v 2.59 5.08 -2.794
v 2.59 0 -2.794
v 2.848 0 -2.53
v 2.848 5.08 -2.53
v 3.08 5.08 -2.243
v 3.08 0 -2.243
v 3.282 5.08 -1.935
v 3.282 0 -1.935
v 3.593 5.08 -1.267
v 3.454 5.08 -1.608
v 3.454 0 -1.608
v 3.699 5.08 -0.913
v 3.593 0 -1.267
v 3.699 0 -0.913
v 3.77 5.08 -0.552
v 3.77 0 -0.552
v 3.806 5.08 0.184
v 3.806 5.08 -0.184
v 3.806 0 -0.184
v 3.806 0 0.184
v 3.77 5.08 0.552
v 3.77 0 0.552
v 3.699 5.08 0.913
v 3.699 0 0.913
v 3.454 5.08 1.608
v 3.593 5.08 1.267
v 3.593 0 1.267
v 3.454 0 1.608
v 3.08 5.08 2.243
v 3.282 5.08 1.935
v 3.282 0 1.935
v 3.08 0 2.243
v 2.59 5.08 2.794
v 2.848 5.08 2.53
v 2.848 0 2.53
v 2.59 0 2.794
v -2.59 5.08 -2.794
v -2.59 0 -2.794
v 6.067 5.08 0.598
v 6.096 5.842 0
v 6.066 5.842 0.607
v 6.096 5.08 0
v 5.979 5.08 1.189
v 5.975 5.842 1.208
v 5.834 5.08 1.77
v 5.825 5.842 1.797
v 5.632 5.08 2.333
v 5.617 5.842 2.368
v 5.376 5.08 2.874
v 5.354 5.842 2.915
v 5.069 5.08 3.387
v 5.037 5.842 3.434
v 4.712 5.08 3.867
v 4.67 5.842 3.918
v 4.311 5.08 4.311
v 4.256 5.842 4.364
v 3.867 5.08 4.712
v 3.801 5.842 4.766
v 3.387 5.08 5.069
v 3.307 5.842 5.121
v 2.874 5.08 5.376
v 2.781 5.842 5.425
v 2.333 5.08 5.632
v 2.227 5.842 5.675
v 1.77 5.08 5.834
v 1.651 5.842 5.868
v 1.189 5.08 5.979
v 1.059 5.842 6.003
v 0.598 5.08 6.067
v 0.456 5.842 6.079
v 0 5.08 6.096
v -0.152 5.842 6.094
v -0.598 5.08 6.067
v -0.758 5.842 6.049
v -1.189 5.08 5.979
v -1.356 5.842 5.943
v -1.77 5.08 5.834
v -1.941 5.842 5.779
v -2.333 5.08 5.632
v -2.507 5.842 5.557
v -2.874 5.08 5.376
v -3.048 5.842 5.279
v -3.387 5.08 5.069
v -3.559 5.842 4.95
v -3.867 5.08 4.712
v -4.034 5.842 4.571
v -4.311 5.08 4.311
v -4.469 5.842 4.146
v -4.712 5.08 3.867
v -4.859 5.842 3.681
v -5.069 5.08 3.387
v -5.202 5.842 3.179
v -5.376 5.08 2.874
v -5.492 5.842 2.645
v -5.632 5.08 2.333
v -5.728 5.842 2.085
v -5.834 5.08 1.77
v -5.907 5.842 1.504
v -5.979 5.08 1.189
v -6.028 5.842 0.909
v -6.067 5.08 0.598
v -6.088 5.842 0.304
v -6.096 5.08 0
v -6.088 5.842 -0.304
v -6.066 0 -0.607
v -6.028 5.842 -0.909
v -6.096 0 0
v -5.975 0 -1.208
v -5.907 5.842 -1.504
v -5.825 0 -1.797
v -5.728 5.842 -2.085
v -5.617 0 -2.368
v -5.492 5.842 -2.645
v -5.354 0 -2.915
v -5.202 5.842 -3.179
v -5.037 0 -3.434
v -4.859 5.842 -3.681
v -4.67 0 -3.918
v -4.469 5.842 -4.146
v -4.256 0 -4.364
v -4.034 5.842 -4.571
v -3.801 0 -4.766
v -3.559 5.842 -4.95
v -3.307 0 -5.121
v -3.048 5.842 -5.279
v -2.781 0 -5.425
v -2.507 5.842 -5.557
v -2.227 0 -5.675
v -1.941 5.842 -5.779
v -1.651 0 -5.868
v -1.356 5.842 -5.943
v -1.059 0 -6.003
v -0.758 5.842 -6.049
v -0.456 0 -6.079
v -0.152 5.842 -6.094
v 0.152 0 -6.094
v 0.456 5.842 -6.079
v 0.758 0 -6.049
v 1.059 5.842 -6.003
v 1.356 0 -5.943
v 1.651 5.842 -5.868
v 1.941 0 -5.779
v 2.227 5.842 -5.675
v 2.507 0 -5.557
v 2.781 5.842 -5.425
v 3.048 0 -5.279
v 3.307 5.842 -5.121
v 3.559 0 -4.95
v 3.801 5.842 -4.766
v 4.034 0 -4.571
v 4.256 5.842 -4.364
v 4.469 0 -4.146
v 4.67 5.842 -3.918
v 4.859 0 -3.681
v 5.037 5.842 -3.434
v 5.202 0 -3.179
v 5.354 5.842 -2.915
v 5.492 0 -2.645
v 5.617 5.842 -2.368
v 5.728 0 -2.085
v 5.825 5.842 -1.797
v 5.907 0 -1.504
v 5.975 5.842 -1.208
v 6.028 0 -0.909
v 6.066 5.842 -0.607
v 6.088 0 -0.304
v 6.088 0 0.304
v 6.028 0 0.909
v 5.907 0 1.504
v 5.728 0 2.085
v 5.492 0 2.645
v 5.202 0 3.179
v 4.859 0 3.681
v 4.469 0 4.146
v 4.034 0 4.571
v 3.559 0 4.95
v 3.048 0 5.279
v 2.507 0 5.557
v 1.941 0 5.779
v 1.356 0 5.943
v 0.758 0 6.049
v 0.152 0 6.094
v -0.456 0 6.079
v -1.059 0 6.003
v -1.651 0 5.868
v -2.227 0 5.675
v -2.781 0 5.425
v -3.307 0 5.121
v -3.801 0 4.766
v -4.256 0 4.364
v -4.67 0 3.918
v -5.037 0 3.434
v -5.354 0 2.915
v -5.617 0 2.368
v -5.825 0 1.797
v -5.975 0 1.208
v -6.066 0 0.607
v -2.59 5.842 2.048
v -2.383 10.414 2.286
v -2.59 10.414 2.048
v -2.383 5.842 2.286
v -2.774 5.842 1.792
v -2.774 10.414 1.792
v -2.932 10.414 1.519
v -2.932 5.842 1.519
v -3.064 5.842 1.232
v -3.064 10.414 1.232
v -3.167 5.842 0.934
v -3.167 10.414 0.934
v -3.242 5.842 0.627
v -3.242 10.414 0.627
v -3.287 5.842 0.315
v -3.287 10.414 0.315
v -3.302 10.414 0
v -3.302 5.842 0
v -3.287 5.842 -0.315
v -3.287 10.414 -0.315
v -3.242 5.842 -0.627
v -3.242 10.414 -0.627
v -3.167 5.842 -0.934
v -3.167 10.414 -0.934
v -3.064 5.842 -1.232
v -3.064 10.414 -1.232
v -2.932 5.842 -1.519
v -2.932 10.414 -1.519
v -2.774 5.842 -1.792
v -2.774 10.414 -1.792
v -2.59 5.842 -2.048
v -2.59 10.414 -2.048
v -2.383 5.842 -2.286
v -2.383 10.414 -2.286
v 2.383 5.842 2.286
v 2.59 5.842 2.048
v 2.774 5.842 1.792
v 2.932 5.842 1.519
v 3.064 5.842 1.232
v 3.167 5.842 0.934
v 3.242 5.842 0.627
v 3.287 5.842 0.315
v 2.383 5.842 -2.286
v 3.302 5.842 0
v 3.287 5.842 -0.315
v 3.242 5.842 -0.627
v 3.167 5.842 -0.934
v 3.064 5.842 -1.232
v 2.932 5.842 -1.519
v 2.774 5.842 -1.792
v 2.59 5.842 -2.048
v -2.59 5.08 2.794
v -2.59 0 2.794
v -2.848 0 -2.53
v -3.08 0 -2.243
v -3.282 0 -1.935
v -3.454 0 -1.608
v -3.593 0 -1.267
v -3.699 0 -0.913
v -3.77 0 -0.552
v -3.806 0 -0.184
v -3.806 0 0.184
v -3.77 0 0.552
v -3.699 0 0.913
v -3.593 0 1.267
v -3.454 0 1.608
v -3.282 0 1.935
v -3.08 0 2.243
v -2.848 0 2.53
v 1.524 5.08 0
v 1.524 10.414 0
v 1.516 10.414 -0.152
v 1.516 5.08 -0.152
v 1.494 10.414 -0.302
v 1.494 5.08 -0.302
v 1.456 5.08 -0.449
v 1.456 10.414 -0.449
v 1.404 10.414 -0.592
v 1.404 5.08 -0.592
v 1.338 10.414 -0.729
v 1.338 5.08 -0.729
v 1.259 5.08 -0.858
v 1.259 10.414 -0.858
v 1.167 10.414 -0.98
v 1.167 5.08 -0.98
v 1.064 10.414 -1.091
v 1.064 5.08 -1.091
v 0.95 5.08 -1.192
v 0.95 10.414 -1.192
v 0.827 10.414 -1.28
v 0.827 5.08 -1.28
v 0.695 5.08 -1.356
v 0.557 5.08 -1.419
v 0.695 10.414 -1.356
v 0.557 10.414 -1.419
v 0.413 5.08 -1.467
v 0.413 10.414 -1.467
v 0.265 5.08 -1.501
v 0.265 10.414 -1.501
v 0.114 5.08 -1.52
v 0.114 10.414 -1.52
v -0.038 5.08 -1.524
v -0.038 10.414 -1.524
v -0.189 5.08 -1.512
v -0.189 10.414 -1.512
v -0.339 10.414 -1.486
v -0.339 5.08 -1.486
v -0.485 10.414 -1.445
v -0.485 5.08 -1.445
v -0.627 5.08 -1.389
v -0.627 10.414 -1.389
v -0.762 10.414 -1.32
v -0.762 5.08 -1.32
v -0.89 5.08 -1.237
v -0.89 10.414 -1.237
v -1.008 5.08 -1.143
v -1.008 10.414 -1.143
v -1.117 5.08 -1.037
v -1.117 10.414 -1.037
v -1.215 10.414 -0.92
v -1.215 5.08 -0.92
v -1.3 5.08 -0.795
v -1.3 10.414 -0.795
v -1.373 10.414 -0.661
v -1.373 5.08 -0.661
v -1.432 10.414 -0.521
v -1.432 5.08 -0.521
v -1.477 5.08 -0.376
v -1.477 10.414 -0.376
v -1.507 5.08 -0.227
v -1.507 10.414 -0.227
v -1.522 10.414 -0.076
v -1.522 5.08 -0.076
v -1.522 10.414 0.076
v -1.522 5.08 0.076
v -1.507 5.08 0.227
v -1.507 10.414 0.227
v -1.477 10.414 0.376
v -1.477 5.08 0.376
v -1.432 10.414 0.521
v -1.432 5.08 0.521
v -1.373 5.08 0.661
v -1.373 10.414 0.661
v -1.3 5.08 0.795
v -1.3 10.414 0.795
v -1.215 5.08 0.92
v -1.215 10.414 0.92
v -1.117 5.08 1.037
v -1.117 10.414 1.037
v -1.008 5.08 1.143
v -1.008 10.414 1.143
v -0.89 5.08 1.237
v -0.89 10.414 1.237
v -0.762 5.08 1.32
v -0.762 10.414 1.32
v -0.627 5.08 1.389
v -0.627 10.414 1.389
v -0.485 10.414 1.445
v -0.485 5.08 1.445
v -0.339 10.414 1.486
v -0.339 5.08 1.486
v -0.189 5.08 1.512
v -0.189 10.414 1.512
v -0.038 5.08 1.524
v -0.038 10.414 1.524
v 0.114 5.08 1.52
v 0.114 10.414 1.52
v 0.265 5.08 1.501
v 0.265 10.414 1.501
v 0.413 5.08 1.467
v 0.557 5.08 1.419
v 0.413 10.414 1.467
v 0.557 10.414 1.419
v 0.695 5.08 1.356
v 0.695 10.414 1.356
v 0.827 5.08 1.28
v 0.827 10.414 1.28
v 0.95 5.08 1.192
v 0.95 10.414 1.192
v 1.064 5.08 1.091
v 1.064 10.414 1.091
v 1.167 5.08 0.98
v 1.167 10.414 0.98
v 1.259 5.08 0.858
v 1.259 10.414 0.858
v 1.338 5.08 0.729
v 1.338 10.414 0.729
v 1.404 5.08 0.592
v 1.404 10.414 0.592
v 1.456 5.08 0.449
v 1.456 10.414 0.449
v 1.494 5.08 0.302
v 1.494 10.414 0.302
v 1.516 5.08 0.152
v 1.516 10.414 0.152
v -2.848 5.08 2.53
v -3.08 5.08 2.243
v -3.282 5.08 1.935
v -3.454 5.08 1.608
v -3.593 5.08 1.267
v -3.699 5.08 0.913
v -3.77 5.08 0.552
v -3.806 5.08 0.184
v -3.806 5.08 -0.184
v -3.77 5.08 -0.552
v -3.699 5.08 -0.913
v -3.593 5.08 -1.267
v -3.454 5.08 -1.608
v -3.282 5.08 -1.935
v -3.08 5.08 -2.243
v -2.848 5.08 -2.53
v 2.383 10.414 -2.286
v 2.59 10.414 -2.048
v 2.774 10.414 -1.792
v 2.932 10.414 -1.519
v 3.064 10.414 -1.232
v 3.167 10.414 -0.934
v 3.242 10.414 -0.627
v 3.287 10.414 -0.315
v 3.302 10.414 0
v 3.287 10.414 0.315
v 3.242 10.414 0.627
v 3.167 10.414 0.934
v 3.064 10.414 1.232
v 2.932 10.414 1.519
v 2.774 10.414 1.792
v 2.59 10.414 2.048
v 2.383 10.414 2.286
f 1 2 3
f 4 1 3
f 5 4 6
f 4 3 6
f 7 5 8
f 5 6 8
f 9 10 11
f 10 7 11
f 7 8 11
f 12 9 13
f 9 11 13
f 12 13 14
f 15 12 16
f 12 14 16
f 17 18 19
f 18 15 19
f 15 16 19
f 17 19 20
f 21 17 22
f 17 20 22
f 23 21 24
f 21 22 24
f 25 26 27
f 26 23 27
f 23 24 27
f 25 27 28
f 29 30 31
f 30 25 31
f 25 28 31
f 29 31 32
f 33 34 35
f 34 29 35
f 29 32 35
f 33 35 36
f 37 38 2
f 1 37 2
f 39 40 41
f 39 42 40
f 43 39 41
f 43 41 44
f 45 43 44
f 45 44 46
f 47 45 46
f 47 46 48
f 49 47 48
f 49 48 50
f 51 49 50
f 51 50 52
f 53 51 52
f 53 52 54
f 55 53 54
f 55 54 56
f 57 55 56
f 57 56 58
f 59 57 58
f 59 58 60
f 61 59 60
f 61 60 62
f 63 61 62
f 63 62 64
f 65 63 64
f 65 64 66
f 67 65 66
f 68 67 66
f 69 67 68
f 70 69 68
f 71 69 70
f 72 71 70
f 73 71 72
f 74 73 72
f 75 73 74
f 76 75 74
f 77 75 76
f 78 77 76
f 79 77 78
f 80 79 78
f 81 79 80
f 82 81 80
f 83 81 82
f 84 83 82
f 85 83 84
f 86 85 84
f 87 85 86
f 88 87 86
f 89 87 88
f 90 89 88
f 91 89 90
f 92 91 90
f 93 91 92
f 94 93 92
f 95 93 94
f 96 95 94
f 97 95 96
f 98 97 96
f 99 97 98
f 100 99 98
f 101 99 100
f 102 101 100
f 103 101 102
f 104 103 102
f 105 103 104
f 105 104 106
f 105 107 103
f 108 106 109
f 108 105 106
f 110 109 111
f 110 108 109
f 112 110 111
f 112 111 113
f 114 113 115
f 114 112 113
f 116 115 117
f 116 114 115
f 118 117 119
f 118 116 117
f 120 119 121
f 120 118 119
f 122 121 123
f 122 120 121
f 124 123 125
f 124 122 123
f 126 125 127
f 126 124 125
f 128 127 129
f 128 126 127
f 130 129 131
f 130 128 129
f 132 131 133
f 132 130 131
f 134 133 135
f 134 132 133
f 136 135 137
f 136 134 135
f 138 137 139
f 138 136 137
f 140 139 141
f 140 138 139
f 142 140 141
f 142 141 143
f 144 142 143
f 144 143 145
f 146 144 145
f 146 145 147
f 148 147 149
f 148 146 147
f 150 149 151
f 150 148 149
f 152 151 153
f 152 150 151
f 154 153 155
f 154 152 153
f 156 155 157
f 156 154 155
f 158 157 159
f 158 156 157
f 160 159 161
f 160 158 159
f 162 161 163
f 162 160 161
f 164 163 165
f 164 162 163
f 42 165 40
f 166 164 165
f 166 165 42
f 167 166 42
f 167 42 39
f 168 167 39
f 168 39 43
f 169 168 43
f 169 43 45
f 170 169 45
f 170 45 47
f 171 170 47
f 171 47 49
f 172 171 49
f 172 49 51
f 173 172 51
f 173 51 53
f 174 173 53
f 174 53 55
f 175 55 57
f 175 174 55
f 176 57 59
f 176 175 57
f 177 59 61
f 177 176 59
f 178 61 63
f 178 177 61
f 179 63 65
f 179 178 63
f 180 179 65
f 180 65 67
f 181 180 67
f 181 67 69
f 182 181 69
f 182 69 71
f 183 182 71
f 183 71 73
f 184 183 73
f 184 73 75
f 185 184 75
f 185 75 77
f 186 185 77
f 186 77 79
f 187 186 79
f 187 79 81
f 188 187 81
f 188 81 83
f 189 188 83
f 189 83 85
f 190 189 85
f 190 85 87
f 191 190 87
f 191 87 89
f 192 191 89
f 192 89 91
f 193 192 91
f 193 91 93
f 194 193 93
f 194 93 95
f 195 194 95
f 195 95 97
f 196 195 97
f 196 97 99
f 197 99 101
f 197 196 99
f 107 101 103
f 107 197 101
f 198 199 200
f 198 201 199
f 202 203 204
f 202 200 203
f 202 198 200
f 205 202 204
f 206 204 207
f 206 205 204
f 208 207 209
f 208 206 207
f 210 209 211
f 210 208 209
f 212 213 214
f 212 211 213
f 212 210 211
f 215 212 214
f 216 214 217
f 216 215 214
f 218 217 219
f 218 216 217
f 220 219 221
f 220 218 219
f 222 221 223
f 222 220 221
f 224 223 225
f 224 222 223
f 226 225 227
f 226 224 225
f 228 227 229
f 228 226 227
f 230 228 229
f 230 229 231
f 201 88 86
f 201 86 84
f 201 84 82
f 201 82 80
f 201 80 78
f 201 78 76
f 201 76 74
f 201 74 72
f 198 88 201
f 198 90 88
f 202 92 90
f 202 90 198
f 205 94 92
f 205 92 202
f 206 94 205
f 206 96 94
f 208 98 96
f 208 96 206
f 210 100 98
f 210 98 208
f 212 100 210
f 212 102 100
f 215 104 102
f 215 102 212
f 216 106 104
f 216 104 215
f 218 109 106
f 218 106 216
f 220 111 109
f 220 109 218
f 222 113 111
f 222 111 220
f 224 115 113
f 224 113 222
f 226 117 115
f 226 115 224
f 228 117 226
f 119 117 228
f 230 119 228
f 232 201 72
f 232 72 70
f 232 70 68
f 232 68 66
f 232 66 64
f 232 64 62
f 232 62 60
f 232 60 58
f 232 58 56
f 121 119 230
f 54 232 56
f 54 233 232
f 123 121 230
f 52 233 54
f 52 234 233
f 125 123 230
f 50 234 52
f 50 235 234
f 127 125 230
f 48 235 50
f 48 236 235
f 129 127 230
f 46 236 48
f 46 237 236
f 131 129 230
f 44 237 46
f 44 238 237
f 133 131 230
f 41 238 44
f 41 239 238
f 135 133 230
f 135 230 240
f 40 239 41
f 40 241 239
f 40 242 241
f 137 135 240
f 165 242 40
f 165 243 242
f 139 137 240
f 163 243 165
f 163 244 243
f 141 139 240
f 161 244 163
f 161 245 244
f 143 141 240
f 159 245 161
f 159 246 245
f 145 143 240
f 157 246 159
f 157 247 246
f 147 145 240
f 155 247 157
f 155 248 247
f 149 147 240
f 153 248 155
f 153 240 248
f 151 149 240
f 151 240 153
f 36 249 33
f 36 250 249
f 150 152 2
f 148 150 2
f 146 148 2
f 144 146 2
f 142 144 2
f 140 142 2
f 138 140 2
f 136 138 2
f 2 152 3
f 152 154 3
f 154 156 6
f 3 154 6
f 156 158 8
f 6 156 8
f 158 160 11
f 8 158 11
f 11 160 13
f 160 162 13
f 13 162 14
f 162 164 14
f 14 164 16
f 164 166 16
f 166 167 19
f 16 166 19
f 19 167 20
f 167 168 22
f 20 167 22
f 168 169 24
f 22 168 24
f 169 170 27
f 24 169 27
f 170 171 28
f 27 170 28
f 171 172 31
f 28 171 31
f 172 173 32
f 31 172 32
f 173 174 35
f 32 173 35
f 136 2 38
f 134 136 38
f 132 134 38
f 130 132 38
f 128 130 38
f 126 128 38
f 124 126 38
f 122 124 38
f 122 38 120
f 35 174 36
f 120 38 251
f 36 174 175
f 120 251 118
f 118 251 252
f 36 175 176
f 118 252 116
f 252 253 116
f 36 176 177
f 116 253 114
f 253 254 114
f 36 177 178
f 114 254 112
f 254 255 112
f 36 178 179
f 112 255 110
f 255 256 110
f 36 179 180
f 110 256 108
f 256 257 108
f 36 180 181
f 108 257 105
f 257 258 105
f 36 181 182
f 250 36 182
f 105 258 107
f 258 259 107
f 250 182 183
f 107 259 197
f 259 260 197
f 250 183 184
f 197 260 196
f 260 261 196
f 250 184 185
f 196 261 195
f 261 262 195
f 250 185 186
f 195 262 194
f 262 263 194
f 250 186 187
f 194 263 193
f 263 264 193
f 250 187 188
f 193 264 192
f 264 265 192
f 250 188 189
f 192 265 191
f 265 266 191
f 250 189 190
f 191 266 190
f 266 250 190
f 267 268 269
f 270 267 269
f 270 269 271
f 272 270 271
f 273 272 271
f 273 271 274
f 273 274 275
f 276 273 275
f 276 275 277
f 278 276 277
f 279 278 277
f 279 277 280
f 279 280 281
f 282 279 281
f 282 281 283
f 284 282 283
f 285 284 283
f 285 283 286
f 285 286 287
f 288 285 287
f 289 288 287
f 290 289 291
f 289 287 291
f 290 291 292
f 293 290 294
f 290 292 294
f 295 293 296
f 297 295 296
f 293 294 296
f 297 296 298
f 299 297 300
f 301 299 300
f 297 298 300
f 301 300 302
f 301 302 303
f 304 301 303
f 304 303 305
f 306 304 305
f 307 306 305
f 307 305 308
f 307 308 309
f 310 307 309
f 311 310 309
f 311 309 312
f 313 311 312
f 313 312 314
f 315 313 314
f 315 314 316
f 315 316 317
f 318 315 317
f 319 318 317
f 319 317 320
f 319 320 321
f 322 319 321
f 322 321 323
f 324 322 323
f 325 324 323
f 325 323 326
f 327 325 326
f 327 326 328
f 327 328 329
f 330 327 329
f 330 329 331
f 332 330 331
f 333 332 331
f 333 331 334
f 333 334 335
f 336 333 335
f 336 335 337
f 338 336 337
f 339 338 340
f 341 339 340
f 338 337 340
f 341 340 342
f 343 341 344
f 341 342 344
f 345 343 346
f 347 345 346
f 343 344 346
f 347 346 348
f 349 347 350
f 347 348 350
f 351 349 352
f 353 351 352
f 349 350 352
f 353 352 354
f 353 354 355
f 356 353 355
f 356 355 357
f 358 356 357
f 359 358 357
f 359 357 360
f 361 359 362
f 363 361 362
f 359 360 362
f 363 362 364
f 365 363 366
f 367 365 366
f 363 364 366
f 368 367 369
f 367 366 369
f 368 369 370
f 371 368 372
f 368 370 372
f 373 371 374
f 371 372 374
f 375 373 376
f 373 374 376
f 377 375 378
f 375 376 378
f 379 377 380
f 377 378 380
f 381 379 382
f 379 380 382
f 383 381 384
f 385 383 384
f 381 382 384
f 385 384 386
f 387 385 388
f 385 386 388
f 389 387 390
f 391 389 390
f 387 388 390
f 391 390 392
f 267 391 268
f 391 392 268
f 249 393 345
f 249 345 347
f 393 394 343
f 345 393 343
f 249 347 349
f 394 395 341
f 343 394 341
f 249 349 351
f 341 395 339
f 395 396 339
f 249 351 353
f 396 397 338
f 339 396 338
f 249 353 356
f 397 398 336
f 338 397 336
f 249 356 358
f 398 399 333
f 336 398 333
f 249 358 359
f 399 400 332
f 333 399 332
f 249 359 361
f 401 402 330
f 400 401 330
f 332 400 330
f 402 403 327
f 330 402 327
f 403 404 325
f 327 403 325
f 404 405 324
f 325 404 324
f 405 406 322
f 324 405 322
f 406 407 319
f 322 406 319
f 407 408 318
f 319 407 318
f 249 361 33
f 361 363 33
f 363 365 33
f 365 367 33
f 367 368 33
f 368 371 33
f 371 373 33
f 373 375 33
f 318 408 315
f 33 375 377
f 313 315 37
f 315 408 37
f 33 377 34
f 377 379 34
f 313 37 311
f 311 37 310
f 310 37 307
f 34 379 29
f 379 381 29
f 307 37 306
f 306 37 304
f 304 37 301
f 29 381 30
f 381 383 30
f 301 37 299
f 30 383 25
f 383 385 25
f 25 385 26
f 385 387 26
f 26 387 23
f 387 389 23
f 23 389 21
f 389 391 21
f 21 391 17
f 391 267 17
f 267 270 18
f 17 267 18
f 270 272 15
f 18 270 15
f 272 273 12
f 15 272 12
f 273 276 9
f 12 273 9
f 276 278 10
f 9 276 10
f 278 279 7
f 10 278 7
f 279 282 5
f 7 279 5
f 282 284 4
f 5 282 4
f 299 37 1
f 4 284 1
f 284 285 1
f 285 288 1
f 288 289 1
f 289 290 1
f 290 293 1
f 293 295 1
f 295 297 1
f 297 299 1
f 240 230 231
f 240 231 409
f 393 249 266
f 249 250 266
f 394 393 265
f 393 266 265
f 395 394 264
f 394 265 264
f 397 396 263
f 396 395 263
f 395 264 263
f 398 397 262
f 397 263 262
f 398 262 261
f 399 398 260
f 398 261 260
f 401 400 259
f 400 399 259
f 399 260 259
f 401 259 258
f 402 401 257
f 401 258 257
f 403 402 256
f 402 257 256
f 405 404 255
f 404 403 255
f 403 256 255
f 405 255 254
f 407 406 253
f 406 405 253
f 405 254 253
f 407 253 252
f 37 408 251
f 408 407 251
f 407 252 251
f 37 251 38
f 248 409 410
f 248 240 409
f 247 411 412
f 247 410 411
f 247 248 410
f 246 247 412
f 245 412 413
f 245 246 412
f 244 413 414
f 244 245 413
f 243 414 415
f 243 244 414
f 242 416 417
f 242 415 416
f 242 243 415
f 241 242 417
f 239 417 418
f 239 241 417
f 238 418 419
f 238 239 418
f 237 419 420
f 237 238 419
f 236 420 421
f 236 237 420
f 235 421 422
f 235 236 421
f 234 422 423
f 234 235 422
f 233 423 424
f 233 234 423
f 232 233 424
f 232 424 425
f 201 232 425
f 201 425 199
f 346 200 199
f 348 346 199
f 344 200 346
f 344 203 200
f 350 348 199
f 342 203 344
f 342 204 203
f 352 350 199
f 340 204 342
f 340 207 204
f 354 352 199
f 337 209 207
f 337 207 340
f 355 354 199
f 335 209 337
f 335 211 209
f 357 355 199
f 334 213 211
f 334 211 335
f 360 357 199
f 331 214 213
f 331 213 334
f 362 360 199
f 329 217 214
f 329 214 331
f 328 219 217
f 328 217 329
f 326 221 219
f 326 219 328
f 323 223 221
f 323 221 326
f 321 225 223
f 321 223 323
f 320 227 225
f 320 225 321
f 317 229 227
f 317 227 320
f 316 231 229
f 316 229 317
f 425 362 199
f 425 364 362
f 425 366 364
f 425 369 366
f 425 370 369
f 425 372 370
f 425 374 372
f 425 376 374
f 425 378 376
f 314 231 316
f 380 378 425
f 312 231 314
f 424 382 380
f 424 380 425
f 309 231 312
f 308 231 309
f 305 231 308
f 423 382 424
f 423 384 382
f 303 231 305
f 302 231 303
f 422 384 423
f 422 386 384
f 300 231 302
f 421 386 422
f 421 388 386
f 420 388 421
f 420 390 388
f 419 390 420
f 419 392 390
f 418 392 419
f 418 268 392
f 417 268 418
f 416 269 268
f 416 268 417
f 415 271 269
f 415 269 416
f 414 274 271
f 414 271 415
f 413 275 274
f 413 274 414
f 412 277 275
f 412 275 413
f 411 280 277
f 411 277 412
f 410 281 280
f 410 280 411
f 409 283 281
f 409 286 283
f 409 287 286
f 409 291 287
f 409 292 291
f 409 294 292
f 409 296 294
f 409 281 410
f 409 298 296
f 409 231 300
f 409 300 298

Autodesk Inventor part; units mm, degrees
ref_plane "YZ Plane" through (0, 0, 0) normal (1, 0, 0) x (0, 1, 0)
ref_plane "XZ Plane" through (0, 0, 0) normal (0, 1, 0) x (-1, 0, 0)
ref_plane "XY Plane" through (0, 0, 0) normal (0, 0, 1) x (1, 0, 0)
sketch "Sketch1" plane through (0, 0, 0) normal (0, 1, 0) x (-1, 0, 0)
  circle A0 centre (0, 0) radius 6.096
  line L0 (3.81, 0) -> (-3.81, 0) construction
  line L1 (2.5903, -2.794) -> (-2.5903, -2.794)
  line L2 (2.5903, 2.794) -> (-2.5903, 2.794)
  arc A1 (-2.5903, 2.794) -> (-2.5903, -2.794) centre (0, 0) ccw
  arc A2 (2.5903, -2.794) -> (2.5903, 2.794) centre (0, 0) ccw
  dimension "d0" = 12.192
  dimension "d2" = 5.588
  dimension "d3" = 2.794
  dimension "d13" = 3.81
  dimension "d14" = 3.81
extrude "Extrusion1" add sketch "Sketch1" along normal blind 5.08
sketch "Sketch2" plane through (0, 5.08, 0) normal (0, 1, 0) x (1, 0, 0)
  circle A0 centre (0, 0) radius 6.096
extrude "Extrusion2" add sketch "Sketch2" along normal blind 0.762
sketch "Sketch3" plane through (0, 5.842, 0) normal (0, 1, 0) x (1, 0, 0)
  arc A0 (-2.5903, 2.794) -> (-2.5903, -2.794) centre (0, 0) ccw construction
  arc A1 (-2.5903, 2.794) -> (-2.5903, -2.794) centre (0, 0) ccw projected
  line L0 (-2.5903, 2.794) -> (2.5903, 2.794) construction
  line L1 (-2.5903, 2.794) -> (2.5903, 2.794) projected
  arc A2 (2.5903, -2.794) -> (2.5903, 2.794) centre (0, 0) ccw construction
  arc A3 (2.5903, -2.794) -> (2.5903, 2.794) centre (0, 0) ccw projected
  line L2 (2.5903, -2.794) -> (-2.5903, -2.794) construction
  line L3 (2.5903, -2.794) -> (-2.5903, -2.794) projected
  arc A4 (-2.3827, 2.286) -> (-2.3827, -2.286) centre (0, 0) ccw
  line L4 (-2.3827, 2.286) -> (2.3827, 2.286)
  arc A5 (2.3827, -2.286) -> (2.3827, 2.286) centre (0, 0) ccw
  line L5 (2.3827, -2.286) -> (-2.3827, -2.286)
  point P0 (-2.5903, -2.794)
  dimension "d15" = 0.508
  dimension "d16" = 0.508
  dimension "d17" = 0.508
  dimension "d18" = 0.508
extrude "Extrusion3" add sketch "Sketch3" along normal blind 4.572 contours L4 A5 L5 A4
sketch "Sketch4" plane through (0, 10.414, 0) normal (0, 1, 0) x (1, 0, 0)
  circle A0 centre (0, 0) radius 1.524
  dimension "d10" = 3.048
extrude "Extrusion4" cut sketch "Sketch4" against normal blind 25.4
equation "\"d3\" = 0.5 * d2"
properties part number "axle extender"
